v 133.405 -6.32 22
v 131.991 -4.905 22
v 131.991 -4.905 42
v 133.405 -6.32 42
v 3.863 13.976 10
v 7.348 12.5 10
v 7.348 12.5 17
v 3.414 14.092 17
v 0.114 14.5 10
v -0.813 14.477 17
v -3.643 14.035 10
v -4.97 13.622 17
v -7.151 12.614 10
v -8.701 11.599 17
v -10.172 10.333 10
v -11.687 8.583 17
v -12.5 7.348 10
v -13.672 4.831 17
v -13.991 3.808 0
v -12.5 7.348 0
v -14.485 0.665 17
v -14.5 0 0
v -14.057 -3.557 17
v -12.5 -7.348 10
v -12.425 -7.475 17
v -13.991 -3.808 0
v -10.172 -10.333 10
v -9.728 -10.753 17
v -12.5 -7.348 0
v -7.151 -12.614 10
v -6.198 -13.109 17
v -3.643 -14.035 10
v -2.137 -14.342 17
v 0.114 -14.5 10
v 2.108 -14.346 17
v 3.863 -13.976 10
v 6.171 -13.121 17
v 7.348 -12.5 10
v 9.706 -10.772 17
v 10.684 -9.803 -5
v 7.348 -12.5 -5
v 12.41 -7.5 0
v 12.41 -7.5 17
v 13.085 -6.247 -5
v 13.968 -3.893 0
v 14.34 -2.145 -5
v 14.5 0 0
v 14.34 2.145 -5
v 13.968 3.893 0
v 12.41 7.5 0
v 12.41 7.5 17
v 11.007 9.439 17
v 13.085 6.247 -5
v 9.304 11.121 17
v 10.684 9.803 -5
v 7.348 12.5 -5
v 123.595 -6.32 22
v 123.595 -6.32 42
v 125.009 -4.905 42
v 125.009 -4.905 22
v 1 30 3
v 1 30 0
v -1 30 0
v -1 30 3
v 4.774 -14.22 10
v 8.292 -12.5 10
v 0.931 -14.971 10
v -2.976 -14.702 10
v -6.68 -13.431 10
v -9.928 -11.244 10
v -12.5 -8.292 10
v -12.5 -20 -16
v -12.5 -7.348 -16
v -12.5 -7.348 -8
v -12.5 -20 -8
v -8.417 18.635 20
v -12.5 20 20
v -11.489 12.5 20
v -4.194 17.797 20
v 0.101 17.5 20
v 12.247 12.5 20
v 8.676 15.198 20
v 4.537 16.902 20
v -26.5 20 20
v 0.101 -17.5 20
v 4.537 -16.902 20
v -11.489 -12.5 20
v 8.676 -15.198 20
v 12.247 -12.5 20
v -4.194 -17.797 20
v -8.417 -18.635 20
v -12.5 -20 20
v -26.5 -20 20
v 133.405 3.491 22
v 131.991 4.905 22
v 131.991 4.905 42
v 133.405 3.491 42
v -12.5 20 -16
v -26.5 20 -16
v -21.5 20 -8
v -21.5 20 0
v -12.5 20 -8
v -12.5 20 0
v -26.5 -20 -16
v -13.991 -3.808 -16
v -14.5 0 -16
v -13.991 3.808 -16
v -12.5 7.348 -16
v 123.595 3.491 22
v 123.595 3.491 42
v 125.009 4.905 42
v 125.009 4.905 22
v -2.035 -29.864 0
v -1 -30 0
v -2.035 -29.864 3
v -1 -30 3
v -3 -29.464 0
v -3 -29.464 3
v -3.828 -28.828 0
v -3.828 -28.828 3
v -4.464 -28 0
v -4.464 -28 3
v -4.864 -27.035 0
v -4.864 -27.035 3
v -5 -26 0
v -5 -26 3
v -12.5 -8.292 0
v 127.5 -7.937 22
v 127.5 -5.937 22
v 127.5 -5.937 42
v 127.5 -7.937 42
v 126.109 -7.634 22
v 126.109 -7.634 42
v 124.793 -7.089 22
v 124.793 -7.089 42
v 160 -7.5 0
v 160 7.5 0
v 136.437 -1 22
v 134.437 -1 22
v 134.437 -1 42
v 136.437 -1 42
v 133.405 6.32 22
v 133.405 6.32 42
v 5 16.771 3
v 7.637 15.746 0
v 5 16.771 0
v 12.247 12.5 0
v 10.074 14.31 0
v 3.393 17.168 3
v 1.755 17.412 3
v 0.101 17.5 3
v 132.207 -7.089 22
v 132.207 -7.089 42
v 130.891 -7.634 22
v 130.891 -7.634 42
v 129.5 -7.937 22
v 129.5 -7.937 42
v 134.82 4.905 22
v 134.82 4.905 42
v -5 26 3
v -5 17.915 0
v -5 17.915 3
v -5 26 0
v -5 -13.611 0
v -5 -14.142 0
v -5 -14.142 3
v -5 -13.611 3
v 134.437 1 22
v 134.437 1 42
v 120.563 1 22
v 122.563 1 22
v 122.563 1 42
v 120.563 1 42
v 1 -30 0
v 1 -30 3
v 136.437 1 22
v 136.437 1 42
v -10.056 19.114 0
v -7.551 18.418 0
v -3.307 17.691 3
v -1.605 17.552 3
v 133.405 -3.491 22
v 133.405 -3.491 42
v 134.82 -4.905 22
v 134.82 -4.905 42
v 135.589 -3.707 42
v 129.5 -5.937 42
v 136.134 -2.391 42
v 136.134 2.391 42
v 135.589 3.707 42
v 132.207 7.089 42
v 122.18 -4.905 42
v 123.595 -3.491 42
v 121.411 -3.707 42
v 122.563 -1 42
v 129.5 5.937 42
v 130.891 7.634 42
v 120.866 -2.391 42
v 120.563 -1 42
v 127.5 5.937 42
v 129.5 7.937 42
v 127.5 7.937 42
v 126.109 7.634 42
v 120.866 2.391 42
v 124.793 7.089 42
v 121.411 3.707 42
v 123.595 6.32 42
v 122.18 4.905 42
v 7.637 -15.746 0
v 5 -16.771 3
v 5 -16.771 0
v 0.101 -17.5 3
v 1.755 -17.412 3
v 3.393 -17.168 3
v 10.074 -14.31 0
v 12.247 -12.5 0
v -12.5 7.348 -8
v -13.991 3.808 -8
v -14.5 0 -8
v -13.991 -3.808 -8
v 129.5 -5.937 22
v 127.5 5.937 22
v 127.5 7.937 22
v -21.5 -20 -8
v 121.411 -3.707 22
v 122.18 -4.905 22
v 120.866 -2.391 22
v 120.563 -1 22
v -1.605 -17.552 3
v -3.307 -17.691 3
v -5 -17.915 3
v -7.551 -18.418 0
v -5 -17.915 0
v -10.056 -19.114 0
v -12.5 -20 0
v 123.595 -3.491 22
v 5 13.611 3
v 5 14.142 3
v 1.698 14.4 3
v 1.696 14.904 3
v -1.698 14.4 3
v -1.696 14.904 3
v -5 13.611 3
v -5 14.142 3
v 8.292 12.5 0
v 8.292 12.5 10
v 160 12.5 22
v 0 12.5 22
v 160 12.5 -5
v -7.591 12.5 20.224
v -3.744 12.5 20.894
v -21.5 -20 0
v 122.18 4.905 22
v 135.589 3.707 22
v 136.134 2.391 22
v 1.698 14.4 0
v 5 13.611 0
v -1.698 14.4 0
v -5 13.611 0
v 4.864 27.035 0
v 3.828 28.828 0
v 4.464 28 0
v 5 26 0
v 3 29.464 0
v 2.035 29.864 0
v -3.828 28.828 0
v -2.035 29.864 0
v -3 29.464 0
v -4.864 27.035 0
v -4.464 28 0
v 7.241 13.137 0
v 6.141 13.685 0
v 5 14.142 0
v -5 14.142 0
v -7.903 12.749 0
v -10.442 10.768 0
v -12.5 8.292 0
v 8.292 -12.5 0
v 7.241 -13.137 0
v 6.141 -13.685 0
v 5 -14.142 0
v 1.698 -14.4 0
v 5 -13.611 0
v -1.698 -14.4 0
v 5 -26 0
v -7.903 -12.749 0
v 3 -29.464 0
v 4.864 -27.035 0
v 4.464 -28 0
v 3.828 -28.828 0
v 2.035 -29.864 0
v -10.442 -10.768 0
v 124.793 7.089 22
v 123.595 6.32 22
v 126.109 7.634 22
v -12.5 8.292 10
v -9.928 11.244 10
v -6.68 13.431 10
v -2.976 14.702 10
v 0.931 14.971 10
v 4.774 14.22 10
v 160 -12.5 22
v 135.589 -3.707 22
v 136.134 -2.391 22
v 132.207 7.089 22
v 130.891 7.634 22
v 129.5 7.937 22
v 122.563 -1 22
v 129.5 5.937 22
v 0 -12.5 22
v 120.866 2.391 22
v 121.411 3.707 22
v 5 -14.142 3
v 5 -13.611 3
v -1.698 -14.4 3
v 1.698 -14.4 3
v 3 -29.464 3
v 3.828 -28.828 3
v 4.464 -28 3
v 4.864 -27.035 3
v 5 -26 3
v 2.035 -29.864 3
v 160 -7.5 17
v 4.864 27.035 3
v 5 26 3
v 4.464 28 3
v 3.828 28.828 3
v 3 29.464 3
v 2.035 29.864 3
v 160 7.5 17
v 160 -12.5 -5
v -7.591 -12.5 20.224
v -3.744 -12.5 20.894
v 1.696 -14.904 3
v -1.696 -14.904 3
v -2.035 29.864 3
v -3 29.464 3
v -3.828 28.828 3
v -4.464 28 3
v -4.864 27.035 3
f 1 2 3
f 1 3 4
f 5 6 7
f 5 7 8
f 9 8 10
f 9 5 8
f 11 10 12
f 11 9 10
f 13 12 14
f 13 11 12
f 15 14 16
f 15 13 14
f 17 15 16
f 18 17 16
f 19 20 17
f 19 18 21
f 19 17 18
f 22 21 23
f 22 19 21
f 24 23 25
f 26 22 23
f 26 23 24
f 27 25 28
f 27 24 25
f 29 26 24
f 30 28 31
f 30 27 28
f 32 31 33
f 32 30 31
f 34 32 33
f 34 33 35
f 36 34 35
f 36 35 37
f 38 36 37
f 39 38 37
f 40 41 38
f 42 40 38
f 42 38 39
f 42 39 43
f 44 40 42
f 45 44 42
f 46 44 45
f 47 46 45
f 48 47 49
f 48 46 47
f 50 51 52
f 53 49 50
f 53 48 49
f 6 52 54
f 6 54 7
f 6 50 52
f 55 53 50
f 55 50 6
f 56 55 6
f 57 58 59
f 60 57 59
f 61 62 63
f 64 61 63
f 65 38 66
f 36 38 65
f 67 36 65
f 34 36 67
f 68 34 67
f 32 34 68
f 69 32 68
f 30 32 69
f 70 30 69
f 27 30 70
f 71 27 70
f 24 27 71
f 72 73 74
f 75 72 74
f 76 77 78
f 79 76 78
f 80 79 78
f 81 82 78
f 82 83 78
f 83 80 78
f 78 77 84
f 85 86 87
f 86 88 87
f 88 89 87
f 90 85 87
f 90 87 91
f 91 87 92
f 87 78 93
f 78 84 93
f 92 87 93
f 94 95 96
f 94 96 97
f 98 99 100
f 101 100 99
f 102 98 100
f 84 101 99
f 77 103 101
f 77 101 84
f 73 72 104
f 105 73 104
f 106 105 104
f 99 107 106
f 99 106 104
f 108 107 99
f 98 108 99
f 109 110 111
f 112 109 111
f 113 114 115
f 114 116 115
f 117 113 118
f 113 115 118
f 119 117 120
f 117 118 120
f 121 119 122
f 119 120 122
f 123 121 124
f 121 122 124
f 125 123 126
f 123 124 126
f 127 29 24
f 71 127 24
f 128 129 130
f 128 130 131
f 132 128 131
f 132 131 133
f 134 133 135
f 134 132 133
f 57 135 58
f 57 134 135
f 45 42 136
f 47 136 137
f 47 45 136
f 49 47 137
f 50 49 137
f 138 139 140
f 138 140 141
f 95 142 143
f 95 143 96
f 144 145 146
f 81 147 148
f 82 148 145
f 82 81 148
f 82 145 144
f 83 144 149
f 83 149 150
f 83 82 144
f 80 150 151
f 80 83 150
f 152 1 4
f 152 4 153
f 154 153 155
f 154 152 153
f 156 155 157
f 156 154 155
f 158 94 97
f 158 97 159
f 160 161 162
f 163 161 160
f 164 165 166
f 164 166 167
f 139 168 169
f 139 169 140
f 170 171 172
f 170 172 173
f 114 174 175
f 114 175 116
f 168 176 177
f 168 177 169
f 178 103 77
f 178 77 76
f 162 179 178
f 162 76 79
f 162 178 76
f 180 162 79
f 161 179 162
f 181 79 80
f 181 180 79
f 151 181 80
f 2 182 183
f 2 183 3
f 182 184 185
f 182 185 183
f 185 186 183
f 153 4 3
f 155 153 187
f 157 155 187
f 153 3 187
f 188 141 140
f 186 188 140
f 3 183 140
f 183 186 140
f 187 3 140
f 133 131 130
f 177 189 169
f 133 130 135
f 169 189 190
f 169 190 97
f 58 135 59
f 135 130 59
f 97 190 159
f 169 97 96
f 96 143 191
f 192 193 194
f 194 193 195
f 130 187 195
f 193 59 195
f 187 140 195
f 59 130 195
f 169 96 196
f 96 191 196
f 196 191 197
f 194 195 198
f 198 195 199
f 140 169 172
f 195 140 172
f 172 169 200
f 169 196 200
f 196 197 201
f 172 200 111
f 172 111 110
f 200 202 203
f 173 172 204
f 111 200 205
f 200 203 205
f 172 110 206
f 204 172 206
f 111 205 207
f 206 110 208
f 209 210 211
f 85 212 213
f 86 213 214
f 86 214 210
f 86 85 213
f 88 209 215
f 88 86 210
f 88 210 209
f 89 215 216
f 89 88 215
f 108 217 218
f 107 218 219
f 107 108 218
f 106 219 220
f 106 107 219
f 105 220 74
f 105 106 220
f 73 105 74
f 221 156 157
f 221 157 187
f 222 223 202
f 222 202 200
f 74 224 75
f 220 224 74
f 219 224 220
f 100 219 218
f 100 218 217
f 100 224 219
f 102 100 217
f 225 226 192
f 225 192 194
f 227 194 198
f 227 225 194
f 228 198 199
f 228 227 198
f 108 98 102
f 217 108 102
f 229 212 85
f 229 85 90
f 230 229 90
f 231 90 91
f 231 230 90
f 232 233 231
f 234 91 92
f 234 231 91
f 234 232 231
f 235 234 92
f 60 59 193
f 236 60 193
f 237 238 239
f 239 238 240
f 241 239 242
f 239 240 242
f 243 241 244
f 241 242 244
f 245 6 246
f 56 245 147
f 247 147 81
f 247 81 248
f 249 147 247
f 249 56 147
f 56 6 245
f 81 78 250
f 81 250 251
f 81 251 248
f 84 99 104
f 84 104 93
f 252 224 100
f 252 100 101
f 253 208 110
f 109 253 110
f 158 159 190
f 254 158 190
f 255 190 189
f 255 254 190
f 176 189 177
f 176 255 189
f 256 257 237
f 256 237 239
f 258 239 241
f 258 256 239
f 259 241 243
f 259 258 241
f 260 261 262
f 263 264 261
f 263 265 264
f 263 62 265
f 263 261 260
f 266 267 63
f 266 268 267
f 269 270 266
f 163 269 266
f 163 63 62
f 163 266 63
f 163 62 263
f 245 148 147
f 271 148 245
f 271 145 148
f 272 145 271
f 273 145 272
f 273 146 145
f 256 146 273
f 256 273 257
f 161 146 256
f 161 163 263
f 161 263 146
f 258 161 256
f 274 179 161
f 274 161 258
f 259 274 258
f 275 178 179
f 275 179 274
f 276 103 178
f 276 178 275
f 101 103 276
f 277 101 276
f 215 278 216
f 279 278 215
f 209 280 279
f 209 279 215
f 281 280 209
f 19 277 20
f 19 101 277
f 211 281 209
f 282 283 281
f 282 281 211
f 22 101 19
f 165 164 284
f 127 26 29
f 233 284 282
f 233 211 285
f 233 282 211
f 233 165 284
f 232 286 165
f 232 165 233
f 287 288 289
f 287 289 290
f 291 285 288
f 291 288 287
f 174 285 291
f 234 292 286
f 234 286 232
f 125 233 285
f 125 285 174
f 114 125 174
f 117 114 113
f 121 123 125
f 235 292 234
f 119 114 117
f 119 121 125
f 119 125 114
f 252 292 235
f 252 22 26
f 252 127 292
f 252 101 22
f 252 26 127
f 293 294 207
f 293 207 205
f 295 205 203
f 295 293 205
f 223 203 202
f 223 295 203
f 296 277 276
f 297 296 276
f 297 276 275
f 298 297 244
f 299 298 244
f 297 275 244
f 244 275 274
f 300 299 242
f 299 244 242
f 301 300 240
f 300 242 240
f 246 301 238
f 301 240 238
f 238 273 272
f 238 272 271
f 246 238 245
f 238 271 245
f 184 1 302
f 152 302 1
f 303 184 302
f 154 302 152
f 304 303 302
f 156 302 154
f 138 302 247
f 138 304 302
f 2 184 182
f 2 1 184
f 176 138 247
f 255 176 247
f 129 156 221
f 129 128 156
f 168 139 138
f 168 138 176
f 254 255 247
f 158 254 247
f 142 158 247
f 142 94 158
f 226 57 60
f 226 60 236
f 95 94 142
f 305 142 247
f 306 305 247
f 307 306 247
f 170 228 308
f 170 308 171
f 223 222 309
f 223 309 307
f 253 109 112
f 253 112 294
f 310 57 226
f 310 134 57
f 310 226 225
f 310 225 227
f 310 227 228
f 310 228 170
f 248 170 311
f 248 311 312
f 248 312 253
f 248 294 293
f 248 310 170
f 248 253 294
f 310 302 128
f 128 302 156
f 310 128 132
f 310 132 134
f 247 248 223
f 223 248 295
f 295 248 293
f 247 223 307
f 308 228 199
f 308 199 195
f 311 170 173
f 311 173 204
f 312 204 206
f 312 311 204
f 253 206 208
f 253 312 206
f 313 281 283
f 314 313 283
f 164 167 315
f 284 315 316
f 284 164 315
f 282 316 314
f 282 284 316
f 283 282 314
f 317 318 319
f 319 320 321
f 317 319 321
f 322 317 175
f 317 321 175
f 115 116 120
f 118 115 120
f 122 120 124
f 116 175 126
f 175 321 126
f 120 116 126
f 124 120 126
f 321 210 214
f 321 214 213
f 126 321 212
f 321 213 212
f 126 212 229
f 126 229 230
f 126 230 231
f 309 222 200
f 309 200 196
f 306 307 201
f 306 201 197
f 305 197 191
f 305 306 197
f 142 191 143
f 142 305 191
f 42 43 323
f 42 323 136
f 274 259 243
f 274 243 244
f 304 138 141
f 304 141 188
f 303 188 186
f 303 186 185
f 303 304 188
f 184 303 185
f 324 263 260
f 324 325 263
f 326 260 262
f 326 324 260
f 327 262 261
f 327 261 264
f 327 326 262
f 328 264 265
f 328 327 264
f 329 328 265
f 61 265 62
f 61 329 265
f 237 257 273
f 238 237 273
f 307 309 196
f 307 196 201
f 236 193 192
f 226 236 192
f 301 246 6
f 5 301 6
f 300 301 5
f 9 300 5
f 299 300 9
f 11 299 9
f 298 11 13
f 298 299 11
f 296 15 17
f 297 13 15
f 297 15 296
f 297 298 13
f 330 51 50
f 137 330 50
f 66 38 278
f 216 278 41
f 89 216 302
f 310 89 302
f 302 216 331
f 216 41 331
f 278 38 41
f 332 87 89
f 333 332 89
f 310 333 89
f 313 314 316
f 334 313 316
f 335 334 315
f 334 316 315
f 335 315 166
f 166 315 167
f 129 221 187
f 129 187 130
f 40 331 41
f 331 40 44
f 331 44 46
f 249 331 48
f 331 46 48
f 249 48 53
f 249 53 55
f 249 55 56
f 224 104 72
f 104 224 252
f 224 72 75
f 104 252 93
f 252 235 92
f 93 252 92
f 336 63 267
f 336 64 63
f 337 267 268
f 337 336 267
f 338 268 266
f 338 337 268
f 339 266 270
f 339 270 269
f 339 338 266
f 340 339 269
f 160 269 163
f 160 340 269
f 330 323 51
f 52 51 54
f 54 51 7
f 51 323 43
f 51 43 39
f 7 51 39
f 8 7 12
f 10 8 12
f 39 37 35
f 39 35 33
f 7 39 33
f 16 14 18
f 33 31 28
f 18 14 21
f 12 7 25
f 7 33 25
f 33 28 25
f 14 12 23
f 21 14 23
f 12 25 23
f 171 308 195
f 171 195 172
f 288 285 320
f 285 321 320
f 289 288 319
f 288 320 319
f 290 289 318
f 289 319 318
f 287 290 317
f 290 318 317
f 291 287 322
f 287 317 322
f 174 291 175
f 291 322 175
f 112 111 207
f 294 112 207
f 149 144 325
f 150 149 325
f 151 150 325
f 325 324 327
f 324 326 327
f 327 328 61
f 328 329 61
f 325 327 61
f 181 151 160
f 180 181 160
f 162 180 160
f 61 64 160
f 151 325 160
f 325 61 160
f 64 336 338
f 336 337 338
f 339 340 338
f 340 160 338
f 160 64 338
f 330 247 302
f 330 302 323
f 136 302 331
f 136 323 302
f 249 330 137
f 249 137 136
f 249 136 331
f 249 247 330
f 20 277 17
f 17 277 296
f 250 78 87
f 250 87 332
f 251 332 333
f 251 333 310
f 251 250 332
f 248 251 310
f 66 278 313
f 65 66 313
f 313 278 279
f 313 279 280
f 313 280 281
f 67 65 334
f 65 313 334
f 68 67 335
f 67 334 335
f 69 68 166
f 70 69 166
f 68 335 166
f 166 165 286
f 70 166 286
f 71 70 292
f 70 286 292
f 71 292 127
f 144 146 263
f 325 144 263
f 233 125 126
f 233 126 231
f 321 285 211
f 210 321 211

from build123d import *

# Parameters (mm, degrees)
SKETCH3_R                = 15
CUT_EXTRUDE1_DEPTH       = 10
SKETCH4_W                = 17
SKETCH4_H                = 15
CUT_EXTRUDE2_DEPTH       = 32.819805153
SKETCH4_4_W              = 27
SKETCH4_4_H              = 25
SKETCH4_4_W_2            = 17
SKETCH4_4_H_2            = 15
EXTRUDE_THIN2_DEPTH      = 160
SKETCH5_W                = 10
SKETCH5_H                = 60
BOSS_EXTRUDE1_DEPTH      = 3
FILLET1_R                = 4
BOSS_EXTRUDE5_DEPTH      = 9
BOSS_EXTRUDE5_DEPTH_BACK = 5
SKETCH6_W                = 36
SKETCH6_H                = 40
CUT_EXTRUDE4_DEPTH       = 17
CUT_EXTRUDE4_DEPTH_BACK  = 160
SKETCH2_3_R              = 14.5
CUT_EXTRUDE5_DEPTH       = 170.068033643
CUT_EXTRUDE5_DEPTH_BACK  = 170.068033643
SKETCH8_W                = 9
SKETCH8_H                = 8
FILLET2_R                = 34
FILLET3_R                = 34
BOSS_EXTRUDE6_DEPTH      = 20


with BuildPart() as part:
    # Extrude-Thin1: read off the stored shape, not the designer's step
    # Extrude-Thin1 outline → Extrude-Thin1 (revolve)
    with BuildSketch(Plane.XZ):
        Polygon((17.5, 20), (0, 20), (0, 17), (14.5, 17), (14.5, 3), (0, 3), (0, 0), (17.5, 0), align=None)
    revolve(axis=Axis((0, 0, 0), (0, 0, 1)))

    # Sketch3 → Cut-Extrude1 (cut)
    with BuildSketch(Plane(origin=(0, 0, 0), x_dir=(-1, 0, 0), z_dir=(0, 0, -1))):
        Circle(SKETCH3_R)
    extrude(amount=-CUT_EXTRUDE1_DEPTH, mode=Mode.SUBTRACT)

    # Sketch4 → Cut-Extrude2 (cut, through all)
    with BuildSketch(Plane(origin=(0, 0, 0), x_dir=(0, 0, -1), z_dir=(1, 0, 0))):
        with Locations((-8.5, 0)):
            Rectangle(SKETCH4_W, SKETCH4_H)
    extrude(amount=CUT_EXTRUDE2_DEPTH, mode=Mode.SUBTRACT)

    # Sketch4<4> → Extrude-Thin2 (add)
    with BuildSketch(Plane(origin=(0, 0, 0), x_dir=(0, 0, -1), z_dir=(1, 0, 0))):
        with Locations((-8.5, 0)):
            Rectangle(SKETCH4_4_W, SKETCH4_4_H)
        with Locations((-8.5, 0)):
            Rectangle(SKETCH4_4_W_2, SKETCH4_4_H_2, mode=Mode.SUBTRACT)
    extrude(amount=EXTRUDE_THIN2_DEPTH)

    # Sketch5 → Boss-Extrude1 (add)
    with BuildSketch(Plane(origin=(0, 0, 0), x_dir=(-1, 0, 0), z_dir=(0, 0, -1))):
        Rectangle(SKETCH5_W, SKETCH5_H)
    extrude(amount=-BOSS_EXTRUDE1_DEPTH)

    # Fillet1
    fillet1_edges = [part.edges().sort_by_distance(p)[0] for p in [
        (-5, 30, 1.5),
        (5, -30, 1.5),
        (-5, -30, 1.5),
        (5, 30, 1.5),
    ]]
    fillet(fillet1_edges, radius=FILLET1_R)

    # Sketch6 → Boss-Extrude5 (add, two sides: drawn at the far end of the back side and taken through both)
    with BuildSketch(Plane.ZY.offset(17.5).offset(-BOSS_EXTRUDE5_DEPTH_BACK)):
        with Locations((2, 0)):
            Rectangle(SKETCH6_W, SKETCH6_H)
    extrude(amount=BOSS_EXTRUDE5_DEPTH + BOSS_EXTRUDE5_DEPTH_BACK)

    # Sketch2<3> → Cut-Extrude4 (cut, two sides: drawn at the far end of the back side and taken through both)
    with BuildSketch(Plane.XY.offset(-CUT_EXTRUDE4_DEPTH_BACK)):
        with Locations(Location((0, 0, 0), (0, 0, 149.549685979))):
            Circle(SKETCH2_3_R)
    extrude(amount=CUT_EXTRUDE4_DEPTH + CUT_EXTRUDE4_DEPTH_BACK, mode=Mode.SUBTRACT)

    # Sketch8 → Cut-Extrude5 (cut, two sides: drawn at the far end of the back side and taken through both)
    with BuildSketch(Plane.XZ.offset(20).offset(-CUT_EXTRUDE5_DEPTH_BACK)):
        with Locations((-17, -4)):
            Rectangle(SKETCH8_W, SKETCH8_H)
    extrude(amount=CUT_EXTRUDE5_DEPTH + CUT_EXTRUDE5_DEPTH_BACK, mode=Mode.SUBTRACT)

    # Fillet2
    # the kernel refuses this fillet: 34 mm, written as the material it adds along each edge
    with BuildSketch(Plane(origin=(-12.5, -12.247448714, 0), x_dir=(0.923034160497627, -0.3847179987399096, 0), z_dir=(0, 0, 1))) as fillet2_piece_1:
        with BuildLine():
            CenterArc((26.914388587, -31.306789136), FILLET2_R, 112.958457005, 21.780491129)
            Line((2.982546016, -7.155869668), (2.503909164, -6.672851279))
            ThreePointArc((2.503909164, -6.672851279), (0.863609779, -3.839543073), (-0.627663229, -0.261608239))
            Line((-0.627663229, -0.261608239), (0.26524325, 0.626135783))
            ThreePointArc((0.26524325, 0.626135783), (6.826113047, -0.706211474), (13.386982845, 0.626135783))
            Line((13.386982845, 0.626135783), (13.652226095, 0))
        make_face()
    extrude(amount=20)
    with BuildSketch(Plane(origin=(-12.5, 12.247448714, 0), x_dir=(0, 1, 0), z_dir=(0, 0, 1))) as fillet2_piece_2:
        with BuildLine():
            CenterArc((39.251685543, -12.798614811), FILLET2_R, 157.887286265, 21.780491129)
            Line((5.252257101, -12.601471052), (4.572268533, -12.597528177))
            ThreePointArc((4.572268533, -12.597528177), (3.277985866, -6.029043261), (-0.475900864, -0.485714286))
            Line((-0.475900864, -0.485714286), (0, 0.68))
            ThreePointArc((0, 0.68), (3.876275643, 0.68), (7.122568601, 0.255972296))
            Line((7.122568601, 0.255972296), (7.752551286, 0))
        make_face()
    extrude(amount=20)

    # Fillet3
    # the kernel refuses this fillet: 34 mm, written as the material it adds along each edge
    with BuildSketch(Plane(origin=(0, 12.5, 20), x_dir=(-1, 0, 0), z_dir=(0, -1, 0))) as fillet3_piece_1:
        with BuildLine():
            CenterArc((11.489125293, -34), FILLET3_R, 90, 19.749922796)
            Line((0, -2), (0, 0))
            Line((0, 0), (11.489125293, 0))
        make_face()
    extrude(amount=25)

    # Sketch9 → Boss-Extrude6 (add)
    with BuildSketch(Plane.XY.offset(22)):
        with BuildLine():
            Line((136.437253933, 1), (134.437253933, 1))
            Line((134.437253933, 1), (134.437253933, -1))
            Line((134.437253933, -1), (136.437253933, -1))
            ThreePointArc((136.437253933, -1), (135.89103626, -3.061467459), (134.819592861, -4.905379299))
            Line((134.819592861, -4.905379299), (133.405379299, -3.491165737))
            Line((133.405379299, -3.491165737), (131.991165737, -4.905379299))
            Line((131.991165737, -4.905379299), (133.405379299, -6.319592861))
            ThreePointArc((133.405379299, -6.319592861), (131.561467459, -7.39103626), (129.5, -7.937253933))
            Line((129.5, -7.937253933), (129.5, -5.937253933))
            Line((129.5, -5.937253933), (127.5, -5.937253933))
            Line((127.5, -5.937253933), (127.5, -7.937253933))
            ThreePointArc((127.5, -7.937253933), (125.438532541, -7.39103626), (123.594620701, -6.319592861))
            Line((123.594620701, -6.319592861), (125.008834263, -4.905379299))
            Line((125.008834263, -4.905379299), (123.594620701, -3.491165737))
            Line((123.594620701, -3.491165737), (122.180407139, -4.905379299))
            ThreePointArc((122.180407139, -4.905379299), (121.10896374, -3.061467459), (120.562746067, -1))
            Line((120.562746067, -1), (122.562746067, -1))
            Line((122.562746067, -1), (122.562746067, 1))
            Line((122.562746067, 1), (120.562746067, 1))
            ThreePointArc((120.562746067, 1), (121.10896374, 3.061467459), (122.180407139, 4.905379299))
            Line((122.180407139, 4.905379299), (123.594620701, 3.491165737))
            Line((123.594620701, 3.491165737), (125.008834263, 4.905379299))
            Line((125.008834263, 4.905379299), (123.594620701, 6.319592861))
            ThreePointArc((123.594620701, 6.319592861), (125.438532541, 7.39103626), (127.5, 7.937253933))
            Line((127.5, 7.937253933), (127.5, 5.937253933))
            Line((127.5, 5.937253933), (129.5, 5.937253933))
            Line((129.5, 5.937253933), (129.5, 7.937253933))
            ThreePointArc((129.5, 7.937253933), (131.561467459, 7.39103626), (133.405379299, 6.319592861))
            Line((133.405379299, 6.319592861), (131.991165737, 4.905379299))
            Line((131.991165737, 4.905379299), (133.405379299, 3.491165737))
            Line((133.405379299, 3.491165737), (134.819592861, 4.905379299))
            ThreePointArc((134.819592861, 4.905379299), (135.89103626, 3.061467459), (136.437253933, 1))
        make_face()
    extrude(amount=BOSS_EXTRUDE6_DEPTH)


solid = part.part
